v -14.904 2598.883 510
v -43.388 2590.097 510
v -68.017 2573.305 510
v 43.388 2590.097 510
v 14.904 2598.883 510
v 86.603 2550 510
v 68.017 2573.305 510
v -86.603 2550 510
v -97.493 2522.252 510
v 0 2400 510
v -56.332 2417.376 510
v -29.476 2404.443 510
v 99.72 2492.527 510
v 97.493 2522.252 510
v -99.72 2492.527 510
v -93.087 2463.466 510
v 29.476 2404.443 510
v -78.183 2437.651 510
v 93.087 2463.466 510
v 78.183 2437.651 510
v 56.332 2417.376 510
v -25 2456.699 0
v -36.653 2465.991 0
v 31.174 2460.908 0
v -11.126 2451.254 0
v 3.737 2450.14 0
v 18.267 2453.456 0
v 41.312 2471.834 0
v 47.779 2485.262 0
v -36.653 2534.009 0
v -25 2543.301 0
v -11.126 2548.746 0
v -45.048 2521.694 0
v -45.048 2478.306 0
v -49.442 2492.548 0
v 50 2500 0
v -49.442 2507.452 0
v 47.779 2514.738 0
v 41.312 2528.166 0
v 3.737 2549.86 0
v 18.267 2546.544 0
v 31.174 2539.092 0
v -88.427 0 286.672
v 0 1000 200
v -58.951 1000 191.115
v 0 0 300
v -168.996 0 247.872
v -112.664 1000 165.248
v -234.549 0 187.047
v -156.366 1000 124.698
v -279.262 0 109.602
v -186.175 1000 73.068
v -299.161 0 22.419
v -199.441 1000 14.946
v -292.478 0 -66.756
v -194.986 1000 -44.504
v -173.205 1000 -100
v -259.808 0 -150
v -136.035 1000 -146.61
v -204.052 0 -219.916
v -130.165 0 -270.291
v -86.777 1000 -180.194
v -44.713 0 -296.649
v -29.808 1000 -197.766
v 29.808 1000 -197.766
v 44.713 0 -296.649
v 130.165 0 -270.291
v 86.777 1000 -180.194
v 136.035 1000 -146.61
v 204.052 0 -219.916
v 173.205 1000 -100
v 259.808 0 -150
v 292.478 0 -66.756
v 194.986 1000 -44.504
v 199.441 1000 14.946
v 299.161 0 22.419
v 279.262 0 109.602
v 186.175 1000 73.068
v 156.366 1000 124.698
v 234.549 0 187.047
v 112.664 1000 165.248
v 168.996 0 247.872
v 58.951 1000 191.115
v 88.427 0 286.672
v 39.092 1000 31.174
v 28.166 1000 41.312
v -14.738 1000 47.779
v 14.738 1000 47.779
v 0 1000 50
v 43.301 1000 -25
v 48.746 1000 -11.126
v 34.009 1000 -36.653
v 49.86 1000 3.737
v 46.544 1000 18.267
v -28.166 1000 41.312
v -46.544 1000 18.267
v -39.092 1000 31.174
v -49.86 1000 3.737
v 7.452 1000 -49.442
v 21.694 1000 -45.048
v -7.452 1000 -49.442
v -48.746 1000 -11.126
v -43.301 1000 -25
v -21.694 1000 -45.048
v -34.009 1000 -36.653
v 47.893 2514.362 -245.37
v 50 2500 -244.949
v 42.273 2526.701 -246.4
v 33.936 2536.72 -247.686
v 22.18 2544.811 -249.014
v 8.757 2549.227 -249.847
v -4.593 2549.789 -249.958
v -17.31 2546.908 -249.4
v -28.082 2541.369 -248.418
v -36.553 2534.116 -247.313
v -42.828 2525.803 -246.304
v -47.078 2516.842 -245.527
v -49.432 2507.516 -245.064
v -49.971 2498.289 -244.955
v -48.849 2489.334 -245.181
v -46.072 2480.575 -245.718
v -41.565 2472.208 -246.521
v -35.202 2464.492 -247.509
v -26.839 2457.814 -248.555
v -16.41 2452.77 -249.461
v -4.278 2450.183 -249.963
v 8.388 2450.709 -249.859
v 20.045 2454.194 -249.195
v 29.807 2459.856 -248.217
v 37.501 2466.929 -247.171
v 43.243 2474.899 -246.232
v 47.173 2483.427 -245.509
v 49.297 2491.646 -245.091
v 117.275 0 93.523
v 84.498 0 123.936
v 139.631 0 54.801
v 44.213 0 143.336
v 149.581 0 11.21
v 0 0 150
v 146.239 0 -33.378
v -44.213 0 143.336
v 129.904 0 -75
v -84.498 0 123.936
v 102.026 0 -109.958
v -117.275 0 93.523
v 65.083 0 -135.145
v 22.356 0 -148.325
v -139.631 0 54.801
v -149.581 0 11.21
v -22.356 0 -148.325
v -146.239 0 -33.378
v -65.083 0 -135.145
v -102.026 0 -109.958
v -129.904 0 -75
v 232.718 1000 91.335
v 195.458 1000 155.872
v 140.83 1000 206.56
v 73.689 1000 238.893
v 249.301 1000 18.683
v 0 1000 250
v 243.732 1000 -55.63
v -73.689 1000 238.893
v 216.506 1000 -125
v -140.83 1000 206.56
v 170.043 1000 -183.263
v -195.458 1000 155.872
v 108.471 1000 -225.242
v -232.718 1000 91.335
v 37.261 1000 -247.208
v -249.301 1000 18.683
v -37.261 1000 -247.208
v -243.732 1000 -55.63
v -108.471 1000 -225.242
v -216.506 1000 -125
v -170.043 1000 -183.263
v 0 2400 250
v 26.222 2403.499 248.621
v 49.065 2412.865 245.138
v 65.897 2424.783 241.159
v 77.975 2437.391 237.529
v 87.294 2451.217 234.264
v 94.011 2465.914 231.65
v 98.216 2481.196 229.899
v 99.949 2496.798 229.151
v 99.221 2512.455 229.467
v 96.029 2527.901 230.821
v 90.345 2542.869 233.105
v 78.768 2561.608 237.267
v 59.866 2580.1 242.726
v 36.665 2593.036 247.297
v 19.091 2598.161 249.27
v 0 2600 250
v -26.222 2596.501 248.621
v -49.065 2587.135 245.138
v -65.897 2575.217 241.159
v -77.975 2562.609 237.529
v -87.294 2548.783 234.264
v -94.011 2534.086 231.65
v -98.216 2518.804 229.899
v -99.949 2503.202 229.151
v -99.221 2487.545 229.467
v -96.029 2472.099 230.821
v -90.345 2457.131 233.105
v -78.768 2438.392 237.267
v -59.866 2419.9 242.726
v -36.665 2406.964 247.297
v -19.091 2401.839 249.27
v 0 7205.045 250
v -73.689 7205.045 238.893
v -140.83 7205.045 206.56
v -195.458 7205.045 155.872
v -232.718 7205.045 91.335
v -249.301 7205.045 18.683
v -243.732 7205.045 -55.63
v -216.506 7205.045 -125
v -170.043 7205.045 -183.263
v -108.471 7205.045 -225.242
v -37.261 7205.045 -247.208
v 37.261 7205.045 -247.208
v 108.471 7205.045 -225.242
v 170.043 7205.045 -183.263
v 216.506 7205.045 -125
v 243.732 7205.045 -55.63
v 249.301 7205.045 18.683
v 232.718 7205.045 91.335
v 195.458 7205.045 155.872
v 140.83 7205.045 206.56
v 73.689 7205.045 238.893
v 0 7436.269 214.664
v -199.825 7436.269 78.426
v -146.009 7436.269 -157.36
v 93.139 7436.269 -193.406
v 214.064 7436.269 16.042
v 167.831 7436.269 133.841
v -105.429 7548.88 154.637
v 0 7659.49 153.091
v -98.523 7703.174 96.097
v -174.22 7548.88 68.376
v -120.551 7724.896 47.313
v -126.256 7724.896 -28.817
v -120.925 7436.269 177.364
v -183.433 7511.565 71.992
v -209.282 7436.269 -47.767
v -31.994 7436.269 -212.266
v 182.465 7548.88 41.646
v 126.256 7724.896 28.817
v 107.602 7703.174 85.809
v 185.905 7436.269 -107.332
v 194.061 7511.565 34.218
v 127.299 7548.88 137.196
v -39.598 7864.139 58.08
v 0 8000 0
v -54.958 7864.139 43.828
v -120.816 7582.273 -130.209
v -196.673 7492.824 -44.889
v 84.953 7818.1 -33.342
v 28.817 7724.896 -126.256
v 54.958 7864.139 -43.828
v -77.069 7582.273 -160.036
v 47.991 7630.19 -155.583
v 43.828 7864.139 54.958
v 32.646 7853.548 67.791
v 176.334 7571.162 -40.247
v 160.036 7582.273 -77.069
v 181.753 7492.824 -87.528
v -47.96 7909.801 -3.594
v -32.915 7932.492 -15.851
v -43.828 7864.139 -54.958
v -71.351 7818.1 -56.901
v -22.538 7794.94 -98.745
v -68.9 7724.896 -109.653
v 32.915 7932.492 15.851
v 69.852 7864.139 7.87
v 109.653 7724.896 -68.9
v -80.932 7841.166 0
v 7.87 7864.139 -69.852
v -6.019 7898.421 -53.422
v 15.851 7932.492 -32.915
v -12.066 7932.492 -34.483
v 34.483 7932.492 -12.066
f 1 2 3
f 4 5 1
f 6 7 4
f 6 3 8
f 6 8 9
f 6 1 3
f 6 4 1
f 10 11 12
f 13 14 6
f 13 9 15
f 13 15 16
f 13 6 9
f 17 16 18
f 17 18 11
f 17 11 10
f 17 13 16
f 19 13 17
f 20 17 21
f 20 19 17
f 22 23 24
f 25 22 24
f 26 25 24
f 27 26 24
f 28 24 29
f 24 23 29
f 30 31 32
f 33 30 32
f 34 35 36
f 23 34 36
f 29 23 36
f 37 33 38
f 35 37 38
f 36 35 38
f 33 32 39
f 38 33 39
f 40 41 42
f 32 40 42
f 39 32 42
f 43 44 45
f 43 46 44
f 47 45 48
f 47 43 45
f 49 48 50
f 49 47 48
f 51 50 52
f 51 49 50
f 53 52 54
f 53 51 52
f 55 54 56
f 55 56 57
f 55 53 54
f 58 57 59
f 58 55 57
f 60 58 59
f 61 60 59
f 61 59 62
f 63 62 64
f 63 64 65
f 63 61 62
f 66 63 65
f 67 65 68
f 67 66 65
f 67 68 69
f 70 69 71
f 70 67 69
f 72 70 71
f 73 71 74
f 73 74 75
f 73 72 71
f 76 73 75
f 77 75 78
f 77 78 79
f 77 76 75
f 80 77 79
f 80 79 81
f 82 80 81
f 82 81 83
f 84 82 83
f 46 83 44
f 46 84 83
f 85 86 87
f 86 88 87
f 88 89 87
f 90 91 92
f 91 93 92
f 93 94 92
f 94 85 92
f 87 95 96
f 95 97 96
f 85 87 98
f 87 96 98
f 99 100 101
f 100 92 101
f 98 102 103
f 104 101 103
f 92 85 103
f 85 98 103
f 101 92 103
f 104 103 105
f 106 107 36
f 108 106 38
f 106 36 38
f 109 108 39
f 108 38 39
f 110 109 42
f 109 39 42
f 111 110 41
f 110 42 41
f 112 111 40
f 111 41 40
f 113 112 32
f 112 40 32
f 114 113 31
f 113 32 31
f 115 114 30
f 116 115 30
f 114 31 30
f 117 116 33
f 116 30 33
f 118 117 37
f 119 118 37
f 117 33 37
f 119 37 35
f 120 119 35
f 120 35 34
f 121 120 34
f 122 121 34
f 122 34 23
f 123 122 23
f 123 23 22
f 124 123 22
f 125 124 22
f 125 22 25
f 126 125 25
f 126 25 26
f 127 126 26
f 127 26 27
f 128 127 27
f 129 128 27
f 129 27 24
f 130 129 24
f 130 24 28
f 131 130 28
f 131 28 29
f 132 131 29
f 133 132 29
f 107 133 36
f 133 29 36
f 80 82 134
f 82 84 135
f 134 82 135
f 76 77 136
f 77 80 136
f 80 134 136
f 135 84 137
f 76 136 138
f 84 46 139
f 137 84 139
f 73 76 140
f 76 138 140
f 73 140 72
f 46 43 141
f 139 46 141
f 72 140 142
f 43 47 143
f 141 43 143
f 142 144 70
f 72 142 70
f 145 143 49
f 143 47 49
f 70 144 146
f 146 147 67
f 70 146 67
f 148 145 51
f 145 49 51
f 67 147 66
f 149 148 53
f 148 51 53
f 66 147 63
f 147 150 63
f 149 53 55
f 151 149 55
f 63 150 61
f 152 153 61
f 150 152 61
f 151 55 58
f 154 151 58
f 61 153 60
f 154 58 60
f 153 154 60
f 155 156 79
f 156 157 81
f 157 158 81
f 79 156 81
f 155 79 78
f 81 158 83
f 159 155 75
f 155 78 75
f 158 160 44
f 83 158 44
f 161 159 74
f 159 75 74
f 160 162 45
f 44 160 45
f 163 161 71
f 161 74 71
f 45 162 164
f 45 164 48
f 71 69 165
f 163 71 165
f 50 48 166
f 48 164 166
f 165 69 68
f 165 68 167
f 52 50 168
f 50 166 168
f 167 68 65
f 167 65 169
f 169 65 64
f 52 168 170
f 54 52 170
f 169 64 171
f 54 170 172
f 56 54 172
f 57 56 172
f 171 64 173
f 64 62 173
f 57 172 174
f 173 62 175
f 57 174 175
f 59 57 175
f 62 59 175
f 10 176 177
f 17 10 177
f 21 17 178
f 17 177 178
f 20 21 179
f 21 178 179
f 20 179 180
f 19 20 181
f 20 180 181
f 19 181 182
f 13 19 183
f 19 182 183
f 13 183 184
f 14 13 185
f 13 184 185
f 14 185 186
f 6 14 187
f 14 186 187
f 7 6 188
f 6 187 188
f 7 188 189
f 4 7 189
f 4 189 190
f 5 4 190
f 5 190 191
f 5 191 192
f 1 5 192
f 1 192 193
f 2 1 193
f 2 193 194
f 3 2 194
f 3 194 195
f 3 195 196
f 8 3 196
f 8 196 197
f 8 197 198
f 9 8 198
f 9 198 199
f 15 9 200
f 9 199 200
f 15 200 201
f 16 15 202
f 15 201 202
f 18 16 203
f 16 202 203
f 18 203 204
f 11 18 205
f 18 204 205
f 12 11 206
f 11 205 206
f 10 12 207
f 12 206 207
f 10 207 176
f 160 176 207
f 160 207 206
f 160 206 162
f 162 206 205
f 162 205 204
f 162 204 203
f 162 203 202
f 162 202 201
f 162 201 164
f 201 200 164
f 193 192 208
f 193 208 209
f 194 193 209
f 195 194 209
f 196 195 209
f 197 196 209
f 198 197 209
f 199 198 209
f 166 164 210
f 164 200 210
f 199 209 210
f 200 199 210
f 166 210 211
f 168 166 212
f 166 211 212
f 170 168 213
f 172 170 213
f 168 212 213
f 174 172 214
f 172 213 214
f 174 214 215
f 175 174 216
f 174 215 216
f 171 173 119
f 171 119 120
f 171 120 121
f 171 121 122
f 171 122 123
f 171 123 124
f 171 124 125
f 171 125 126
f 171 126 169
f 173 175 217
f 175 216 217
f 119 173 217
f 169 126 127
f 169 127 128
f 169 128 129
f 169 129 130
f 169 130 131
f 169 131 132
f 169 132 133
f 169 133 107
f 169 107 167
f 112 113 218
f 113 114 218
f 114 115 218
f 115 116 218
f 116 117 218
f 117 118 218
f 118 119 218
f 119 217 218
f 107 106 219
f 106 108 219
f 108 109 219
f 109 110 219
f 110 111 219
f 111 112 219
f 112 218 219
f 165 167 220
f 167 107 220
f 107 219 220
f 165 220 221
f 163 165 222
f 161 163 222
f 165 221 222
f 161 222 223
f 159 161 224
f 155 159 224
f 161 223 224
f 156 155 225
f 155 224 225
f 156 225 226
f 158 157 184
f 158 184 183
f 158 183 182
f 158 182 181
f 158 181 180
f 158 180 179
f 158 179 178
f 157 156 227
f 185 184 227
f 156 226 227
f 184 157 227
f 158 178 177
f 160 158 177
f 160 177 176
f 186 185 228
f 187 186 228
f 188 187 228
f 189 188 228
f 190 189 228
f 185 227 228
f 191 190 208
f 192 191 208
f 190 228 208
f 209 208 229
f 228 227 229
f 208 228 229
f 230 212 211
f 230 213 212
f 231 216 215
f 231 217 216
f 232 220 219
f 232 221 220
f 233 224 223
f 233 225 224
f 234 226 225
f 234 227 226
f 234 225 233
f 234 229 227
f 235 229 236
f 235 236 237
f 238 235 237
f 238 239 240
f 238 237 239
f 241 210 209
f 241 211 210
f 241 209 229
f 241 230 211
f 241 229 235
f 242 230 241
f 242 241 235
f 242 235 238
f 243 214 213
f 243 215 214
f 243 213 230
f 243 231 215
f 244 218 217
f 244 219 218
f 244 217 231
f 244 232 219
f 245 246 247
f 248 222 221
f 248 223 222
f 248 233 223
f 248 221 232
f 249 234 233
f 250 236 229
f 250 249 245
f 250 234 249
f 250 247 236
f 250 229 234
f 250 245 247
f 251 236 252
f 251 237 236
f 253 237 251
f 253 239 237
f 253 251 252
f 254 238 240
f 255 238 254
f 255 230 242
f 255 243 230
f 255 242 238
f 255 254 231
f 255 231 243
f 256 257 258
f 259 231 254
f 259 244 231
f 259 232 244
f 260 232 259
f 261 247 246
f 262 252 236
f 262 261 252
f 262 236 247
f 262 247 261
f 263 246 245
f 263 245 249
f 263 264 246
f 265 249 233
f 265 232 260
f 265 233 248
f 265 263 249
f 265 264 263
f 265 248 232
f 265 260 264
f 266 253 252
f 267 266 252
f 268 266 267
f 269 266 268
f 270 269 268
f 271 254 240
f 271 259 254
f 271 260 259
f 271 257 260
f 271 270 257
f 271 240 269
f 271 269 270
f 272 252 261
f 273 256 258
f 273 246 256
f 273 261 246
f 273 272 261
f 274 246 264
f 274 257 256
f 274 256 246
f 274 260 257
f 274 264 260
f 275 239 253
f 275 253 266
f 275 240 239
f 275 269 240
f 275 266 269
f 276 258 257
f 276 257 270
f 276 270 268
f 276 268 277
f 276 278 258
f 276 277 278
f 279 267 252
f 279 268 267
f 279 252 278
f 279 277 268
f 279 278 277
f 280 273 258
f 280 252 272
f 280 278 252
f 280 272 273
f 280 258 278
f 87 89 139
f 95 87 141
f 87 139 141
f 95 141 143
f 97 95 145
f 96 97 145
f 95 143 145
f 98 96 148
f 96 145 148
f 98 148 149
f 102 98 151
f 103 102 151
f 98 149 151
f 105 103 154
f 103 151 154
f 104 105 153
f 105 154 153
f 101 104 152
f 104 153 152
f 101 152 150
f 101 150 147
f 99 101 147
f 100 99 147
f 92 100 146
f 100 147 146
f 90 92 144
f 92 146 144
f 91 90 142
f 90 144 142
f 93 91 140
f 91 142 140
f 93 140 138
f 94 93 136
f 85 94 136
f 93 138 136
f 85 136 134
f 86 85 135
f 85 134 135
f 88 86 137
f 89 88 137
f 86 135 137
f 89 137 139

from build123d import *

# Parameters (mm, degrees)
SKETCH2_R           = 100
BOSS_EXTRUDE1_DEPTH = 510
SKETCH3_R           = 50
CUT_EXTRUDE1_DEPTH  = 510


with BuildPart() as part:
    # Sketch1 → Revolve1 (revolve)
    with BuildSketch(Plane.XY, mode=Mode.PRIVATE) as revolve1_sk:
        with BuildLine():
            Line((0, 8000), (0, 1000))
            Line((0, 1000), (50, 1000))
            add(Edge.make_bspline(
                [(50, 1000), (88.926420229, 498.892463954), (150, 0)],
                knots=[0, 0, 0, 1, 1, 1], degree=2))
            Line((150, 0), (300, 0))
            add(Edge.make_bspline(
                [(200, 1000), (219.10962266, 496.911485784), (300, 0)],
                knots=[0, 0, 0, 1, 1, 1], degree=2))
            Line((200, 1000), (250, 1000))
            Line((250, 1000), (250, 7205.045074908))
            add(Edge.make_bspline(
                [(0, 8000), (210.009020849, 7628.449489371), (250, 7205.045074908)],
                knots=[0, 0, 0, 1, 1, 1], degree=2))
        make_face()
    revolve(revolve1_sk.sketch.rotate(Axis((0, 402.495416157, 0), (0, -1, 0)), 90), axis=Axis((0, 402.495416157, 0), (0, -1, 0)))

    # Sketch2 → Boss-Extrude1 (add)
    with BuildSketch(Plane.XY):
        with Locations(Location((0, 2500, 0), (0, 0, 270))):
            Circle(SKETCH2_R)
    extrude(amount=BOSS_EXTRUDE1_DEPTH)

    # Sketch3 → Cut-Extrude1 (cut)
    with BuildSketch(Plane.XY):
        with Locations((0, 2500)):
            Circle(SKETCH3_R)
    extrude(amount=-CUT_EXTRUDE1_DEPTH, mode=Mode.SUBTRACT)


solid = part.part
